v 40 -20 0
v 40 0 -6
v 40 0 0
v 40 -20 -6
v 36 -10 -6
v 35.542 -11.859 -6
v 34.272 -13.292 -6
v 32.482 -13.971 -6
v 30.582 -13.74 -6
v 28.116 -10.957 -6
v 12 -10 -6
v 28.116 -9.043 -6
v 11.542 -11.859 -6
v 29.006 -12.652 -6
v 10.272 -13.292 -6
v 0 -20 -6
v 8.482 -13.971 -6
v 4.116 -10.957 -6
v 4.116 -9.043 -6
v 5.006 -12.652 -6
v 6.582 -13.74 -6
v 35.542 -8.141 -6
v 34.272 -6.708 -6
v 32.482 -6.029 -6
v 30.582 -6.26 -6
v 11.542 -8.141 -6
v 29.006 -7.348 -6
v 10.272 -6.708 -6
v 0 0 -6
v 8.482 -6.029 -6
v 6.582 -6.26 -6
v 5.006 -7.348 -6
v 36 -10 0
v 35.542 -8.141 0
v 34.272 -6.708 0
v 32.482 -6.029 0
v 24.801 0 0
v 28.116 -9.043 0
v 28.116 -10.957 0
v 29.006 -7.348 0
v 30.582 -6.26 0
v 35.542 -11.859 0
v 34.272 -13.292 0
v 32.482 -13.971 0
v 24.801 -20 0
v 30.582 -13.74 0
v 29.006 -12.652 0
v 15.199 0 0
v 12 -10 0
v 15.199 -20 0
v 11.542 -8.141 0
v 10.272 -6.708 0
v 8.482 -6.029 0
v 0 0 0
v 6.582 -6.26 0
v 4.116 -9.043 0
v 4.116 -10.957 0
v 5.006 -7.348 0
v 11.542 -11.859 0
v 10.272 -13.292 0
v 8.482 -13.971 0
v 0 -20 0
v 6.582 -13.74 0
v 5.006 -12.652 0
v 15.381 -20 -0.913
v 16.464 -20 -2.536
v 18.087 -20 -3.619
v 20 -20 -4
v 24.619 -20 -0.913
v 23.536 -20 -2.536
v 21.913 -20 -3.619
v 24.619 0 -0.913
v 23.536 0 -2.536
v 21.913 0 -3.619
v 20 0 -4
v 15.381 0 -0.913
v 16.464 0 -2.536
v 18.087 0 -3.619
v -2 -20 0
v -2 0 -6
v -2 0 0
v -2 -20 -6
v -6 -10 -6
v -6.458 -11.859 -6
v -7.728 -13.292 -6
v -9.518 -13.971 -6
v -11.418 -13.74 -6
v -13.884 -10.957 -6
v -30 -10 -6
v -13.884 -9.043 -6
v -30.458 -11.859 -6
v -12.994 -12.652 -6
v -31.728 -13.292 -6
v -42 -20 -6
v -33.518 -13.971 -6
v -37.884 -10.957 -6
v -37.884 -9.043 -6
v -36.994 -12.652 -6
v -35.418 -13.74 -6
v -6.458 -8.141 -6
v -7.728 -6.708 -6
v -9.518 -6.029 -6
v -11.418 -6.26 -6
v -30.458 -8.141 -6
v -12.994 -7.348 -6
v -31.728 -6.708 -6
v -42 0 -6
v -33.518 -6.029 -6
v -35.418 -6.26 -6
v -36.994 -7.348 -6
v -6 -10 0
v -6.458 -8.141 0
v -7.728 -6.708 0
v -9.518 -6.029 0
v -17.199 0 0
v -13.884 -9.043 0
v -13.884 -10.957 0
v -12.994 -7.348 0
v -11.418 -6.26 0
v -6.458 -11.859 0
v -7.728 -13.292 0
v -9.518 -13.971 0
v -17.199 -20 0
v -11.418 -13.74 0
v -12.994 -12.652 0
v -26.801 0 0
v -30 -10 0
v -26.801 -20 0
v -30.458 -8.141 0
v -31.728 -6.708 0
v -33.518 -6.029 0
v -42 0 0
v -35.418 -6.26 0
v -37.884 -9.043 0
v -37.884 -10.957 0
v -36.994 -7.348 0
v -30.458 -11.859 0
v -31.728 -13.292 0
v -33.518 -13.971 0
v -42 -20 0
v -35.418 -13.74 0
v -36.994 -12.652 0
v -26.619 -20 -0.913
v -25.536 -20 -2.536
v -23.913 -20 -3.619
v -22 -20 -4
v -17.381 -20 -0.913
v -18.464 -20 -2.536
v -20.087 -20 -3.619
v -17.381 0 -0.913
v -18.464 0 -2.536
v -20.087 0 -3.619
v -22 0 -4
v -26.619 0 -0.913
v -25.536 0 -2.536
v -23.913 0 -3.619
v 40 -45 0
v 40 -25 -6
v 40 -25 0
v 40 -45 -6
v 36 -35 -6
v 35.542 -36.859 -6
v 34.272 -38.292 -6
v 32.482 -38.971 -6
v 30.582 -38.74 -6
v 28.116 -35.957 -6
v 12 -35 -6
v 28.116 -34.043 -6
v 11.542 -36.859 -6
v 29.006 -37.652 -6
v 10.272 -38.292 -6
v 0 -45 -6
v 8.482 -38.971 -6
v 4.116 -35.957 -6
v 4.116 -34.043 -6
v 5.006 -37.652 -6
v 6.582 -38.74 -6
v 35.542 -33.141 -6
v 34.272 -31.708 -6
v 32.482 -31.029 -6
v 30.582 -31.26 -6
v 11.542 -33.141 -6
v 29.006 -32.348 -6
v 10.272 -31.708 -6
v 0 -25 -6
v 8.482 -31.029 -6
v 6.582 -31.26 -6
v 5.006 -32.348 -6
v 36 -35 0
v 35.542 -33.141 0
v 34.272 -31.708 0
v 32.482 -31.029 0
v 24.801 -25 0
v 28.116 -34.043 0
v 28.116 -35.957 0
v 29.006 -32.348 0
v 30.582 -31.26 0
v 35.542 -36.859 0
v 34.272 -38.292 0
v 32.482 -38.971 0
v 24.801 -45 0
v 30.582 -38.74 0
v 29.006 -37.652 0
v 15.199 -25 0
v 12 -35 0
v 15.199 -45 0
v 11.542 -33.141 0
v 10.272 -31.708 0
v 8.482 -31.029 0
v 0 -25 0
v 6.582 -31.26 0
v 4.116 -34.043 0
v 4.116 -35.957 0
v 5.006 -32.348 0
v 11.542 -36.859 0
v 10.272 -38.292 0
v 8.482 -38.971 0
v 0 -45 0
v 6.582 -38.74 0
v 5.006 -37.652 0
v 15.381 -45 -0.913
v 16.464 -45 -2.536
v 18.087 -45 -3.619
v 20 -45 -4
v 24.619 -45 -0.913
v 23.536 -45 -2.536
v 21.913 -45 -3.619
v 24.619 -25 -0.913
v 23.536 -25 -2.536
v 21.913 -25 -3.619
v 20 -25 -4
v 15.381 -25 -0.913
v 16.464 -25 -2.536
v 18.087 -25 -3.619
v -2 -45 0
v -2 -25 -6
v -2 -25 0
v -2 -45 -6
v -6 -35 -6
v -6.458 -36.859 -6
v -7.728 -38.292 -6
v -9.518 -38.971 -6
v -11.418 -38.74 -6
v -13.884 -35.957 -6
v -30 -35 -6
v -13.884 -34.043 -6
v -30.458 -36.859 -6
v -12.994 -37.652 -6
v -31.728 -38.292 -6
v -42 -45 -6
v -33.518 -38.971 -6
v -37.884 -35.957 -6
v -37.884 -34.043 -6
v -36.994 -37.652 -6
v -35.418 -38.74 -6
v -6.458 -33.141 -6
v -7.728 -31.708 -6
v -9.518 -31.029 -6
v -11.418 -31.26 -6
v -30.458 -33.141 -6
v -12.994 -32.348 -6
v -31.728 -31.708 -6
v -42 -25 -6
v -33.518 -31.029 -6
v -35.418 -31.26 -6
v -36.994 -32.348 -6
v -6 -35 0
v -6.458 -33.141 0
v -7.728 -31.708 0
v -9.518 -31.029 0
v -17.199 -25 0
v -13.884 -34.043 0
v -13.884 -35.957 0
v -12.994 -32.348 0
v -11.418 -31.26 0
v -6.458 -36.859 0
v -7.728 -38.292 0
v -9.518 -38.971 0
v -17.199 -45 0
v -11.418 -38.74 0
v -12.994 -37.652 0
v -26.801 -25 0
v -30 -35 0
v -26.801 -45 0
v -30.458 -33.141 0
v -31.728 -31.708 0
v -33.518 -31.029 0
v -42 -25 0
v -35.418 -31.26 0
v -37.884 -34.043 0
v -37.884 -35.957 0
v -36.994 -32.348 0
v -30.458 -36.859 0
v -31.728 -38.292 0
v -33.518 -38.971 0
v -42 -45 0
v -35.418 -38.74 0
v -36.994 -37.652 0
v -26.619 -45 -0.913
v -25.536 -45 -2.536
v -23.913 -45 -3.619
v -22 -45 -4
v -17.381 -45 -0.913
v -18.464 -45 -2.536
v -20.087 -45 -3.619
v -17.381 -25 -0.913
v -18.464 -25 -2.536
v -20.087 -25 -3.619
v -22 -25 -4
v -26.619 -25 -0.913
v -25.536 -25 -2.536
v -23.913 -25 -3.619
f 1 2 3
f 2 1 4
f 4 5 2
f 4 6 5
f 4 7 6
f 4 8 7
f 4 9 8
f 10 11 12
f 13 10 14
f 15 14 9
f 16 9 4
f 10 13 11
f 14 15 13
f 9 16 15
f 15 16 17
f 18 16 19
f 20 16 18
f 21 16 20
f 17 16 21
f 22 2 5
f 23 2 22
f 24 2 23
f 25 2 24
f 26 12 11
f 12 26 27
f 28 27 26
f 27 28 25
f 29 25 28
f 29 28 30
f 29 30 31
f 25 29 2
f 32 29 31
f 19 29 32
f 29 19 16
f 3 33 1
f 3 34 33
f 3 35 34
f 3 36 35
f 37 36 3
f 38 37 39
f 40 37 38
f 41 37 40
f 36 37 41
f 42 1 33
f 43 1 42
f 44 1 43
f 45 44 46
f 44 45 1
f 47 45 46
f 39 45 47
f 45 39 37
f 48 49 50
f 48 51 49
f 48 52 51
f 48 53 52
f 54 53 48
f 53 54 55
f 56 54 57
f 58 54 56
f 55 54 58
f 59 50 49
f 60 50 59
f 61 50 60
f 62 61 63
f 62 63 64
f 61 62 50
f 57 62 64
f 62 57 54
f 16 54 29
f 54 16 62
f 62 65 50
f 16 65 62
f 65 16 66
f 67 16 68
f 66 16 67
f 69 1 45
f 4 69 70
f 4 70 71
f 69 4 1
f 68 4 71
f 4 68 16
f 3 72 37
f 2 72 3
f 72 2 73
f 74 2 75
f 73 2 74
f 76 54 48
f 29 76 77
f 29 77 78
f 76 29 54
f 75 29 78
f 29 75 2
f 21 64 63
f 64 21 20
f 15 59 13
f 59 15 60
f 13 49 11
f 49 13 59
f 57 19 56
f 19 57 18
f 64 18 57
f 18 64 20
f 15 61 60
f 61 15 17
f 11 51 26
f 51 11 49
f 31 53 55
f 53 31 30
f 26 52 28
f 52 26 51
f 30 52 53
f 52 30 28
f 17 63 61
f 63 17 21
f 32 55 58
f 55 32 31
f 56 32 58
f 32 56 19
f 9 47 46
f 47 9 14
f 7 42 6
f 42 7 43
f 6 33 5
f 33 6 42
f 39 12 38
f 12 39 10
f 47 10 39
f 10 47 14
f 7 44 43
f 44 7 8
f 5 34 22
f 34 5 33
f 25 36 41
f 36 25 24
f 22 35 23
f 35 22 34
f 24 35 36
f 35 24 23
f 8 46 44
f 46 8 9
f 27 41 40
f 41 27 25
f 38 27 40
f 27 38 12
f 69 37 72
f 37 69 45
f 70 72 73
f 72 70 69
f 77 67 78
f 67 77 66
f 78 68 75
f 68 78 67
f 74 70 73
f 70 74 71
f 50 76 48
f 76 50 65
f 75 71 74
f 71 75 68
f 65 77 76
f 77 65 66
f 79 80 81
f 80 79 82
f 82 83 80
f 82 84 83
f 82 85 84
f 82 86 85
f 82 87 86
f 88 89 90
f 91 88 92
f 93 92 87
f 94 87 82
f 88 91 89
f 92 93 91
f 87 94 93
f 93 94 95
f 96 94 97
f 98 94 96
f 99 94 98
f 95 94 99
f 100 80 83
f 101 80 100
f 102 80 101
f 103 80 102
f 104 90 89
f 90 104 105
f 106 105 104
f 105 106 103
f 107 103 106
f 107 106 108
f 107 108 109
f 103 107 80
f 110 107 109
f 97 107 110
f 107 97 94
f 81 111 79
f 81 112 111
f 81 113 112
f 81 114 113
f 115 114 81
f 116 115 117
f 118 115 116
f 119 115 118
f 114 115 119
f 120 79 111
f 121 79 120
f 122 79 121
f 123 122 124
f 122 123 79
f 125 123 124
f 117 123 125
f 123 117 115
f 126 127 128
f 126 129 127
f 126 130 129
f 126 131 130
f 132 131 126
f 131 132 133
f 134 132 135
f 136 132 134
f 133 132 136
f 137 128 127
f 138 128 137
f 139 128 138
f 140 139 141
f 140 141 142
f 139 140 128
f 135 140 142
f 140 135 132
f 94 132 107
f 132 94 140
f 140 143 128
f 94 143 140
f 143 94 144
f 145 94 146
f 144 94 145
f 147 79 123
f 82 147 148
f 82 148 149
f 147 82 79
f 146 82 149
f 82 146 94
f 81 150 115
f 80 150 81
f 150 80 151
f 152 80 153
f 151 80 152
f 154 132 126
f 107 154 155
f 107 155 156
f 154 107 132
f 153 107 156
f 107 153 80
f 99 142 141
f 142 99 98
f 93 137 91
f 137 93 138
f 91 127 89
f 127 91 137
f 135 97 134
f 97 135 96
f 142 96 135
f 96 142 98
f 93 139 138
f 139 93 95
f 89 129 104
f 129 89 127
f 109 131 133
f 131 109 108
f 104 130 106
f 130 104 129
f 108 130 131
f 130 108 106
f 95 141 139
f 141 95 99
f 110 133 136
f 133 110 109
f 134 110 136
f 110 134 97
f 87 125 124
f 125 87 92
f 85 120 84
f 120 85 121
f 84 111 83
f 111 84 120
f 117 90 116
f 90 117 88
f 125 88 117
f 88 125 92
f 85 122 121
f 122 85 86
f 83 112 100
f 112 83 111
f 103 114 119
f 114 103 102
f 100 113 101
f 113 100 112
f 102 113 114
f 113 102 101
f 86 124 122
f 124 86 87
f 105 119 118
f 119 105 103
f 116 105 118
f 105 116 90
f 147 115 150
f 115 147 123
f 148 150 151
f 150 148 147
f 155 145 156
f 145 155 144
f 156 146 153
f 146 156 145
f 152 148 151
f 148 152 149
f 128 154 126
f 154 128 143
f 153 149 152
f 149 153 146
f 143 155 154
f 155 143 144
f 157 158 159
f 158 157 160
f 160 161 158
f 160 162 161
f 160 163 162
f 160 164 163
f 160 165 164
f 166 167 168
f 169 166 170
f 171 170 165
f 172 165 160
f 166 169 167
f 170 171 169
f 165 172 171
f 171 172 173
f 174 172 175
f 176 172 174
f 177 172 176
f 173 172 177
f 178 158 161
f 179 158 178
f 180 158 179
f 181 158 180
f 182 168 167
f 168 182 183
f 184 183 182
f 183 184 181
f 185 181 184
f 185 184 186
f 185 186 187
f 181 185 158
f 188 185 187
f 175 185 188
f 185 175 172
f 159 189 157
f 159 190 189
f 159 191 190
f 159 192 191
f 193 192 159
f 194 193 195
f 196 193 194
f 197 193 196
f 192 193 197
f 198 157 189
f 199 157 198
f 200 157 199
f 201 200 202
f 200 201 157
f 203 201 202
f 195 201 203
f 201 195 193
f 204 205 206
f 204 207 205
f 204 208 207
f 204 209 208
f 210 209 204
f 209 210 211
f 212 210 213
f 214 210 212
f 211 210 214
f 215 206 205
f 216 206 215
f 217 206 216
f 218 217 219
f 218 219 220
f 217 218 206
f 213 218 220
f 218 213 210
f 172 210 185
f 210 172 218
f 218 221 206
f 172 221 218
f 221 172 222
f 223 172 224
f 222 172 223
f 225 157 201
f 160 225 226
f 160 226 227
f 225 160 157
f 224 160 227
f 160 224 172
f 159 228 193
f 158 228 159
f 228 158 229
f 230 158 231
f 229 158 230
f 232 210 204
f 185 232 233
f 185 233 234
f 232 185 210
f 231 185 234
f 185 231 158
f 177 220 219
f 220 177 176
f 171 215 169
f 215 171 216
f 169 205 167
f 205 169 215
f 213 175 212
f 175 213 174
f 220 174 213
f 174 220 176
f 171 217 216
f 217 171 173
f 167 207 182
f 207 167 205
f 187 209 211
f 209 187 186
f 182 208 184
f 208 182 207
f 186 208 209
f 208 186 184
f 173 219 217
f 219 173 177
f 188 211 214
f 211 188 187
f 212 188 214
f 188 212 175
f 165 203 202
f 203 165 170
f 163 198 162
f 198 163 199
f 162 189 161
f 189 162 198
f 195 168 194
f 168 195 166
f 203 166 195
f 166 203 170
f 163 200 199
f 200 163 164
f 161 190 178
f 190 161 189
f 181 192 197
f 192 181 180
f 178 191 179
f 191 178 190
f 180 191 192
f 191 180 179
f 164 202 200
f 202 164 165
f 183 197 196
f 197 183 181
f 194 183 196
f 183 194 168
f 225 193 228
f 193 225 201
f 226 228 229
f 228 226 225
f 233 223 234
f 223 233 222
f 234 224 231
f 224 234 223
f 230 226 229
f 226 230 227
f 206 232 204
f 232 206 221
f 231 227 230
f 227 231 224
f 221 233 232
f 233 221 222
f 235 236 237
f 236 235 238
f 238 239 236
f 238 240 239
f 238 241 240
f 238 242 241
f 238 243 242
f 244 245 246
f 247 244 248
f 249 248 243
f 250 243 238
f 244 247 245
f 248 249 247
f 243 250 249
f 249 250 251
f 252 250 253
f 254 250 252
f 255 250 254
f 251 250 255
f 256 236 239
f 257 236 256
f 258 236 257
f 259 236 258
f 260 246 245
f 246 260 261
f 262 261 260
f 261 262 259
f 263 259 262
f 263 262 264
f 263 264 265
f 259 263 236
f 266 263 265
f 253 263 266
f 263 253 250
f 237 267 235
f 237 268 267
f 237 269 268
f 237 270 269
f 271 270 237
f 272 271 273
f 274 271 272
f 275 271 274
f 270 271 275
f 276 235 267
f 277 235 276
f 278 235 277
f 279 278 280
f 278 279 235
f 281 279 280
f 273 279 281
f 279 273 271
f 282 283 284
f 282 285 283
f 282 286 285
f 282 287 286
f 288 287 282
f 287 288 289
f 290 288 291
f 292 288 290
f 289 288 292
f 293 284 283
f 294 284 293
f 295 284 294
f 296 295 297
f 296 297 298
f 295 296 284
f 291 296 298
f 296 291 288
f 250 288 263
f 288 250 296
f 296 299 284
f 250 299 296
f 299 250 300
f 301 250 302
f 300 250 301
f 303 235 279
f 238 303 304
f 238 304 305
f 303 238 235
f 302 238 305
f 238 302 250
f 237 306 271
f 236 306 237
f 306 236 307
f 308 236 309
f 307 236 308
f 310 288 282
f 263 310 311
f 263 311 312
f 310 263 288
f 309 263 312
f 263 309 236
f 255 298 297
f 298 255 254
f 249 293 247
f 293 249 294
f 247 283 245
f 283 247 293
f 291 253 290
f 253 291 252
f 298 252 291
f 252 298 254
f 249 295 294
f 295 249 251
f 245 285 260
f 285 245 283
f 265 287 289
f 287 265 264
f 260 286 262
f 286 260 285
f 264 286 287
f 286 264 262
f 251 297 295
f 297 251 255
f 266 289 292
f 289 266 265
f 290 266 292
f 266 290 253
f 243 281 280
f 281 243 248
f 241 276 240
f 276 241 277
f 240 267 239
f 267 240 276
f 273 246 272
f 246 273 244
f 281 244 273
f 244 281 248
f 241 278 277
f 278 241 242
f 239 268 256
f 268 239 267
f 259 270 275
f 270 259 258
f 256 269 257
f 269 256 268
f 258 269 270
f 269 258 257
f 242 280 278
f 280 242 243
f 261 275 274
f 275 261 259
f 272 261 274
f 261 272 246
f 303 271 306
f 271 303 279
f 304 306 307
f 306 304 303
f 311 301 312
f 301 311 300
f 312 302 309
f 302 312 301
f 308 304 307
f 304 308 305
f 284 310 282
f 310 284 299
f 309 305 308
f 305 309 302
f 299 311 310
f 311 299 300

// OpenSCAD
 module ConnectorOne (){

difference() {
    
    //Base     X, Y, Z               X, Y, Z
    translate([0, 0, 0])cube(size = [40,20,6]);
    
    //Hole1    X,  Y,  Z
    translate([8, 10, 0])cylinder(h = 40, r = 4);
    
    //Hole2    X,  Y,  Z
    translate([32, 10, 0])cylinder(h = 40, r = 4);
    
    
    //Hole3    X,  Y,  Z
    translate([20, 20, -1]) rotate([90, 0, 0]) cylinder(h = 100, r = 5);
    
    
}

}

rotate([180, 0, 0]){

//         X, Y, Z
translate([0, 0, 0])ConnectorOne();

translate([-42, 0, 0])ConnectorOne();

translate([0, 25, 0])ConnectorOne();

translate([-42, 25, 0])ConnectorOne();
}


//http://blog.cubehero.com/2013/11/19/know-only-10-things-to-be-dangerous-in-openscad/

//https://en.wikibooks.org/wiki/OpenSCAD_User_Manual/Modules
